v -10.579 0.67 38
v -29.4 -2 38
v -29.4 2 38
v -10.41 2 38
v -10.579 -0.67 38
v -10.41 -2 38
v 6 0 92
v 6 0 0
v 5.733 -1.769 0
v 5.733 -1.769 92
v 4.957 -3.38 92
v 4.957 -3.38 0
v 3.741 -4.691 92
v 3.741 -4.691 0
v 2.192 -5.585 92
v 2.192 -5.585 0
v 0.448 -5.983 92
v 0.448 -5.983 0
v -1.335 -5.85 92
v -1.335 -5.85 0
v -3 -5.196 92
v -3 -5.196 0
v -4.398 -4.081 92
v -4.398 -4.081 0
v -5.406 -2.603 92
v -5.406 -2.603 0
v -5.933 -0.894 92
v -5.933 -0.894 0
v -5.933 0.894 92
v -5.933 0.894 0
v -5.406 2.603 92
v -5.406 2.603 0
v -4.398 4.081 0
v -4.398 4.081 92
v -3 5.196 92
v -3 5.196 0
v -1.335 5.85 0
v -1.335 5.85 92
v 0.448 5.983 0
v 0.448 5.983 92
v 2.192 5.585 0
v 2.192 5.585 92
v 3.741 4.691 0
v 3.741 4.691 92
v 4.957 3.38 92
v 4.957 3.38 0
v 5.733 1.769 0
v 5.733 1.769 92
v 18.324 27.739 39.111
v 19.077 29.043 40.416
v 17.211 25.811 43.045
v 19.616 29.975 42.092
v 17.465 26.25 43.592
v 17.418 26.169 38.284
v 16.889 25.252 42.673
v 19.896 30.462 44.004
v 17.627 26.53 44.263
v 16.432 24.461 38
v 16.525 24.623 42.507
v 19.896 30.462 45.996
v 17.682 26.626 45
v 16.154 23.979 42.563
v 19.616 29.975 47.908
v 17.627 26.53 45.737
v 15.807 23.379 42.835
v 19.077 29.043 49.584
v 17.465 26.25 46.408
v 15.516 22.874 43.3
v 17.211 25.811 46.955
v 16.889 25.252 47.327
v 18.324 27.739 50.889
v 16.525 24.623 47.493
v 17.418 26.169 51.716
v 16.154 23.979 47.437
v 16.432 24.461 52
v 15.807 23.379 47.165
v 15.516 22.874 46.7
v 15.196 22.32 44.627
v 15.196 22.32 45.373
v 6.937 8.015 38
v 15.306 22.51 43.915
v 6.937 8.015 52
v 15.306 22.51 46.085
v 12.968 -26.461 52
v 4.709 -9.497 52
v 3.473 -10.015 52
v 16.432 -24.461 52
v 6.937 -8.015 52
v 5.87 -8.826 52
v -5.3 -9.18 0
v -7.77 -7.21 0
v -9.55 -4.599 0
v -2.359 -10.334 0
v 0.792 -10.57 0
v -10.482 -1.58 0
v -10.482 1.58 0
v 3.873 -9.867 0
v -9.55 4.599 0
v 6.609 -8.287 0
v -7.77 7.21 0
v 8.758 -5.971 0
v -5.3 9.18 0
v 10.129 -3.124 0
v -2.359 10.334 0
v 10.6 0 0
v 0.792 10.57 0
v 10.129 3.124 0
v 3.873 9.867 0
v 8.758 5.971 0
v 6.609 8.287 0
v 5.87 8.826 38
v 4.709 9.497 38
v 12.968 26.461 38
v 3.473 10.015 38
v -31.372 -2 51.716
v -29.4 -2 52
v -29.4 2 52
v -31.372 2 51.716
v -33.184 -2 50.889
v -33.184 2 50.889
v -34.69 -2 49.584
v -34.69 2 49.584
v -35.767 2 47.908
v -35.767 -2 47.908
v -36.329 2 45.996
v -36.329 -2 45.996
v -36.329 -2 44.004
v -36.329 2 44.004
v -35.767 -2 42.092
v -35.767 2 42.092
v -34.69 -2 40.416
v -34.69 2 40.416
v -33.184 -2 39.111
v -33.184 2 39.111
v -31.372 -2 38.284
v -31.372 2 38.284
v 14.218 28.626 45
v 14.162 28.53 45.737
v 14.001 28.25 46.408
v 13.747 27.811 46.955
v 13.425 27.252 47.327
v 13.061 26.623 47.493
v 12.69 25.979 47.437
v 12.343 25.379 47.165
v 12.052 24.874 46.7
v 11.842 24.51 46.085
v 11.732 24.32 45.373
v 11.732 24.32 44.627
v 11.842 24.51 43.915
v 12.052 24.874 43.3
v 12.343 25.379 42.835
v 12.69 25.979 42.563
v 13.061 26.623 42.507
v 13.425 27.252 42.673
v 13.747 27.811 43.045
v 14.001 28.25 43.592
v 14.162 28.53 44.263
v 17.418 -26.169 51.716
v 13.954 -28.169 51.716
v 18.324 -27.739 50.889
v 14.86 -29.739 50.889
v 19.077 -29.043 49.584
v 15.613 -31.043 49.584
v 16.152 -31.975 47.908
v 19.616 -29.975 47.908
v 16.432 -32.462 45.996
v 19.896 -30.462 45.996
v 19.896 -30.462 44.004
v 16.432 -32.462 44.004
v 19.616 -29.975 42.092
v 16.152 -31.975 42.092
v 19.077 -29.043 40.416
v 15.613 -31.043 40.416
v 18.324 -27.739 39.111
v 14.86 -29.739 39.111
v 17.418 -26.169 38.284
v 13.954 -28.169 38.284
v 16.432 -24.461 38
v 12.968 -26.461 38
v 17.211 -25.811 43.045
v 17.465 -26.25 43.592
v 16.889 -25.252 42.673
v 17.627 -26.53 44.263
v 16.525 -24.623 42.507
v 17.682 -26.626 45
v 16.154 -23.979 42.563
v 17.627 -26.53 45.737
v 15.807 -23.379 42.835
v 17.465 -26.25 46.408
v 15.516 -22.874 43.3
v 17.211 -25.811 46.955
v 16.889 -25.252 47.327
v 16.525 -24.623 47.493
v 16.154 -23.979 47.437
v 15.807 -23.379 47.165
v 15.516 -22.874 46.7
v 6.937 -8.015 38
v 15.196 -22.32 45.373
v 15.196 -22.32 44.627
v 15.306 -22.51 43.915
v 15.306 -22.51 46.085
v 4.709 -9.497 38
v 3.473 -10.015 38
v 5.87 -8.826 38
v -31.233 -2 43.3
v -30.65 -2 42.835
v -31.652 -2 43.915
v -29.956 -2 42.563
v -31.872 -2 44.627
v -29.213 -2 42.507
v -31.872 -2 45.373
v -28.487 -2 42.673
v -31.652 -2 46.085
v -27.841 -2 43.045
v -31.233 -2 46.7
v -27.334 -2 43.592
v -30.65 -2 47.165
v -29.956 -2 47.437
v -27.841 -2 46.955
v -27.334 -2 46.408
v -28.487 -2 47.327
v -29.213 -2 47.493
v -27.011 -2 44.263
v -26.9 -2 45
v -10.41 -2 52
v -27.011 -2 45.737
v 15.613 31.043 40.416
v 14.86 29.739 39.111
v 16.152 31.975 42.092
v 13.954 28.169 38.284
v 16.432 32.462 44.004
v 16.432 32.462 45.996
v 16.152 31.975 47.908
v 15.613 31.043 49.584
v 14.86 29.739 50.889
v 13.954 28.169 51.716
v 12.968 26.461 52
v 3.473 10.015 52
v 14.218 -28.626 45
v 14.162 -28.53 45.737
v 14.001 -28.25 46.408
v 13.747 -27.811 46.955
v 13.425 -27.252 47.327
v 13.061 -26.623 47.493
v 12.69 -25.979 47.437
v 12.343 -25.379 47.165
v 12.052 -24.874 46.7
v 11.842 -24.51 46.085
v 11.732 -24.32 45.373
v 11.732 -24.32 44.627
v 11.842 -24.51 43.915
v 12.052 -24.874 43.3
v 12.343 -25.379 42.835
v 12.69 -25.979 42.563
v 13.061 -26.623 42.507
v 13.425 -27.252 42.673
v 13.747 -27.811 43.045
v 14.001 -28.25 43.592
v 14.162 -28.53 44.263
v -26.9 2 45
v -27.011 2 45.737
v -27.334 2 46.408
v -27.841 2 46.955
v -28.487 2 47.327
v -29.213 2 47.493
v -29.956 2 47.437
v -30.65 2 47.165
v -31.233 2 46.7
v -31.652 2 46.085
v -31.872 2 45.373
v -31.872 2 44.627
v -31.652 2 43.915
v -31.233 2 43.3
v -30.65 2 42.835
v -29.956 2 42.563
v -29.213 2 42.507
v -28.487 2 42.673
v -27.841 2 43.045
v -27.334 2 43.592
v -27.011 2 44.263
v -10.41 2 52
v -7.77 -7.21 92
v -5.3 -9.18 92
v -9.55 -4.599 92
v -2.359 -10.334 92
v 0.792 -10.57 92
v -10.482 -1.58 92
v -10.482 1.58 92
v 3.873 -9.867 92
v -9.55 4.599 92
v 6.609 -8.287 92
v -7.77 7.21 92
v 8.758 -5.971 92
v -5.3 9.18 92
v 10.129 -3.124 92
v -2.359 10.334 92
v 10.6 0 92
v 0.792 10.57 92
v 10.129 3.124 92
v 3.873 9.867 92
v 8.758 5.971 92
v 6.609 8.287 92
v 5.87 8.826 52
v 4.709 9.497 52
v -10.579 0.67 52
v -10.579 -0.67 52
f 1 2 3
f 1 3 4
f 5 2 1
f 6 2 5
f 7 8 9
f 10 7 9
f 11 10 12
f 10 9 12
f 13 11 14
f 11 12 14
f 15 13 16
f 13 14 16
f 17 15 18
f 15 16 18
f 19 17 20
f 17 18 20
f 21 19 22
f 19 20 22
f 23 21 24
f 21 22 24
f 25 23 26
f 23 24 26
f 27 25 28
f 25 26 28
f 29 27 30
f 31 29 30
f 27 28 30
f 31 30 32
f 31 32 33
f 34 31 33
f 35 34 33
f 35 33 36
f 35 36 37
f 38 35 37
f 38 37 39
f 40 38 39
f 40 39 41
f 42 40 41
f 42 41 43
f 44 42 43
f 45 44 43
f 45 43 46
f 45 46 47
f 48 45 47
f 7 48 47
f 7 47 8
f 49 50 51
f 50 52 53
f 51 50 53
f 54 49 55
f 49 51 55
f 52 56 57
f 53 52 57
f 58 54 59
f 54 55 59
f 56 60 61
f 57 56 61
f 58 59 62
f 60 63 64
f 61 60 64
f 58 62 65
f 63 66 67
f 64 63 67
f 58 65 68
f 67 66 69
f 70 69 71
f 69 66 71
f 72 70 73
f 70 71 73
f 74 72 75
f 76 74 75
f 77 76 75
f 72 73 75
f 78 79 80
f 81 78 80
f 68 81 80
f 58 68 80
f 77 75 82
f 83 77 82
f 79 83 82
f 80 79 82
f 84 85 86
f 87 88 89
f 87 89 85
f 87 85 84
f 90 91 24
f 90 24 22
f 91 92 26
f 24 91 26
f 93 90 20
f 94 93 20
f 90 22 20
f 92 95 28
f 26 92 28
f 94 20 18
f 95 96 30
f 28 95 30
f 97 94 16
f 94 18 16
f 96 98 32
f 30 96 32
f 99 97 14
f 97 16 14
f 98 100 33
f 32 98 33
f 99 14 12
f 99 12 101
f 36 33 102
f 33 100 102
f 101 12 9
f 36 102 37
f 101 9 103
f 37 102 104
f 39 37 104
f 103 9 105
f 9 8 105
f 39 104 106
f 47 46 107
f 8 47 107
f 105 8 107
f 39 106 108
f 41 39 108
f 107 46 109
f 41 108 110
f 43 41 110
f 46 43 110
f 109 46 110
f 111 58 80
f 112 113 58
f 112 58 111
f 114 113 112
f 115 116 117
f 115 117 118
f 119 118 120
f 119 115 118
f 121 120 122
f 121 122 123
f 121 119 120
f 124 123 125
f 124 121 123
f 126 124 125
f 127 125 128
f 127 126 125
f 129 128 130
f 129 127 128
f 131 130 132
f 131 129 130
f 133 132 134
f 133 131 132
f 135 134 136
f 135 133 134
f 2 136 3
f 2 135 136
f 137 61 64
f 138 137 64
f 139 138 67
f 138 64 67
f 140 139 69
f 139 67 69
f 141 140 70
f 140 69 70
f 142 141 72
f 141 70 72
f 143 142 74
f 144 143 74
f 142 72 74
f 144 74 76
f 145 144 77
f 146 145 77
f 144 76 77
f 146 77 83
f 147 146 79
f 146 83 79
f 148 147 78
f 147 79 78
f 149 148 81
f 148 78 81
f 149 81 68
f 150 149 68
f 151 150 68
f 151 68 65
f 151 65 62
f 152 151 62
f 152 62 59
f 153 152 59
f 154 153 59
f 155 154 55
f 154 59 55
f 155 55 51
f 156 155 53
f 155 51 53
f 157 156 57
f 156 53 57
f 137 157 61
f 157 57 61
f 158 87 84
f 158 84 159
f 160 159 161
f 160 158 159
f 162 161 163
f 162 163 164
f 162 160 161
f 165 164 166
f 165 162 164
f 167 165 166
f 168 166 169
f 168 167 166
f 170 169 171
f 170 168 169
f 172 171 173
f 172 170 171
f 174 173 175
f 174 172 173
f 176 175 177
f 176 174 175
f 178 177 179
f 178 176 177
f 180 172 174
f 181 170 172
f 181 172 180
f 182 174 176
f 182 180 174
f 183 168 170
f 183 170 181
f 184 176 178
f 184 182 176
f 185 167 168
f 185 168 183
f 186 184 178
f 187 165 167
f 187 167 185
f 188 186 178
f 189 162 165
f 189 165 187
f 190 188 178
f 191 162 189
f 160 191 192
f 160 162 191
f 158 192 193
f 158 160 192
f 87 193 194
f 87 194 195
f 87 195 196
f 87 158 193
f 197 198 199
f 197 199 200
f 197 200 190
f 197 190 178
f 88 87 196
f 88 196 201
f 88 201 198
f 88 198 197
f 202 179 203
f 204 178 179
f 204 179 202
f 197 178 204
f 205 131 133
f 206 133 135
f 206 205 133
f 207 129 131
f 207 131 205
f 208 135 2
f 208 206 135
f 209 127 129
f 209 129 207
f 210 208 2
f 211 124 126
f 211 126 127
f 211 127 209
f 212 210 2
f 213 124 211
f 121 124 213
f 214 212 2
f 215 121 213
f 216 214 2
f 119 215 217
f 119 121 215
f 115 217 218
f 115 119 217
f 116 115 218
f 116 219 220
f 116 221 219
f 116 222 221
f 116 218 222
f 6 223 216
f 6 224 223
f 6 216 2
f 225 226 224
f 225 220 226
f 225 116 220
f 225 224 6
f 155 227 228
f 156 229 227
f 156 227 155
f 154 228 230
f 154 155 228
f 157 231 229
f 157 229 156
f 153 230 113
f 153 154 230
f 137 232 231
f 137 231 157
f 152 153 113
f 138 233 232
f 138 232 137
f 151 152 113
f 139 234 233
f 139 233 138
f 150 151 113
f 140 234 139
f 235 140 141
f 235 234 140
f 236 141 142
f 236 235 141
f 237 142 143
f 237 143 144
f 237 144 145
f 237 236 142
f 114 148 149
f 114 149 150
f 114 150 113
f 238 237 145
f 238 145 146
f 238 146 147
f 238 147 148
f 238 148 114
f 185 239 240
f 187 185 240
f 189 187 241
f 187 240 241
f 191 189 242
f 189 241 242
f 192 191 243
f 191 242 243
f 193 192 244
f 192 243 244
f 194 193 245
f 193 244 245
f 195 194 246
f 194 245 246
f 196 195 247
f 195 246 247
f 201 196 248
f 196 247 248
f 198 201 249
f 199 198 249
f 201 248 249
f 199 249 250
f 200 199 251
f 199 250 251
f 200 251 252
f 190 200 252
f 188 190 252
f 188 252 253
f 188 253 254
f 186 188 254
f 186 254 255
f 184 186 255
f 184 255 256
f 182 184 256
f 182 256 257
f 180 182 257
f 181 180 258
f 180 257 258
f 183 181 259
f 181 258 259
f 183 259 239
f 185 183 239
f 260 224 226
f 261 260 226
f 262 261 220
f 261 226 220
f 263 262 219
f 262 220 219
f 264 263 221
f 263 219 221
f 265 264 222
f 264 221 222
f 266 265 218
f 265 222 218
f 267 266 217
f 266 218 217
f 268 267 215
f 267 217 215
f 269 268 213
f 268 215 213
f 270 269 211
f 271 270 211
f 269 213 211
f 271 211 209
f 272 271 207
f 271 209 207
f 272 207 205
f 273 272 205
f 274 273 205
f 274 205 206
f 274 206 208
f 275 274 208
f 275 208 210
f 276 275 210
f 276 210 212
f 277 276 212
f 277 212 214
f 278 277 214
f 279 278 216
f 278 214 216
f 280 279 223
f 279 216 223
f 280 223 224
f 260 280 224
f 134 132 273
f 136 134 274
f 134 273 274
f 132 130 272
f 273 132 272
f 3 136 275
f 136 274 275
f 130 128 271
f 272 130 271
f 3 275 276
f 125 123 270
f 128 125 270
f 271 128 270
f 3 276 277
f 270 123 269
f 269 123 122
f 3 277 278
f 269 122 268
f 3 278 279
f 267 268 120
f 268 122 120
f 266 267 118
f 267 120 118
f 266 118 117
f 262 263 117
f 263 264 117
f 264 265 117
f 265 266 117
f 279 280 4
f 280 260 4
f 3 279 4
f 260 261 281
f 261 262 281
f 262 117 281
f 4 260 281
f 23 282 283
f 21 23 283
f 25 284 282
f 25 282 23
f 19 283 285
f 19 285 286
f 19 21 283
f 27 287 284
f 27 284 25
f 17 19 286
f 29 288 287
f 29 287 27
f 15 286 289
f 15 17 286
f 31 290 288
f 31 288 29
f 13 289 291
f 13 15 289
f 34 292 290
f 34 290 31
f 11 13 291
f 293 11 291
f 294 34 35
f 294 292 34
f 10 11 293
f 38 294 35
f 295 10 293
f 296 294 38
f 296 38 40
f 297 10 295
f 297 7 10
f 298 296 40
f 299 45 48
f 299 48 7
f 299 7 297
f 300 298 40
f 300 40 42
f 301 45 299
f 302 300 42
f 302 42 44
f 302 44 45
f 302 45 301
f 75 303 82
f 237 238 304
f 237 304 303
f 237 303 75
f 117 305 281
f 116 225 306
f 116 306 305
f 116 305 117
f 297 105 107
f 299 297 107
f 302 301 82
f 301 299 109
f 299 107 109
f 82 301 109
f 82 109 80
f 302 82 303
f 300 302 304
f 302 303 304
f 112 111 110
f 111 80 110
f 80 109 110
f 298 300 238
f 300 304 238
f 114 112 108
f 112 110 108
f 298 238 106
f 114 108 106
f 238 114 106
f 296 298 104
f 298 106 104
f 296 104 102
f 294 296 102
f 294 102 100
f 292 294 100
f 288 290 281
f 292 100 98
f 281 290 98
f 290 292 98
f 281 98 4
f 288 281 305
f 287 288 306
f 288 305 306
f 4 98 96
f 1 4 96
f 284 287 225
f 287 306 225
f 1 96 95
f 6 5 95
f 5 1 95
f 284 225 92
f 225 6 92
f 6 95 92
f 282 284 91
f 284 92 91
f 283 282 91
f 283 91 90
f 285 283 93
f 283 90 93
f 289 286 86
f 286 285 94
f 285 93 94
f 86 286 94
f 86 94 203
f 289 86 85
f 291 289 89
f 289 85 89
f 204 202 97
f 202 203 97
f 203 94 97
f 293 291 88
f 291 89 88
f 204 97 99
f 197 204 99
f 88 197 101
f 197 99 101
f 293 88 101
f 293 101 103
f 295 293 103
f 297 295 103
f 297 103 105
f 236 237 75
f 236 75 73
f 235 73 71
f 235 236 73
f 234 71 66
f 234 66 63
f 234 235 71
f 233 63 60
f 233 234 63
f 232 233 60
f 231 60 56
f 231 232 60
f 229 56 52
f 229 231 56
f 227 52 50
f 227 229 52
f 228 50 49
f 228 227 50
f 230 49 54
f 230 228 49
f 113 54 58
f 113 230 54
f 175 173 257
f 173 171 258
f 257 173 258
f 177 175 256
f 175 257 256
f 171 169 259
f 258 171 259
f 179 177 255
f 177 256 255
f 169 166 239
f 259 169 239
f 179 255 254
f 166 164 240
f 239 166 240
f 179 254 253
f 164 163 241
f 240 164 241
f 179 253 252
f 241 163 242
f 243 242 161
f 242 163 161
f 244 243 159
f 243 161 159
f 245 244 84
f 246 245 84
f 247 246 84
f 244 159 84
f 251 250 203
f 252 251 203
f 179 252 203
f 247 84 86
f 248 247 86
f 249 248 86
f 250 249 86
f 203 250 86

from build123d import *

# Parameters (mm, degrees)
F0_R            = 10.6
F1_DEPTH        = 92
F2_R            = 6
F3_DEPTH        = 98.1
F5_DEPTH        = 2
F5_COPIES_COUNT = 3
F7_R            = 2.5
F8_DEPTH        = 4
F9_R            = 2.5
F10_DEPTH       = 4
F11_R           = 2.5
F12_DEPTH       = 4


# Not quite as in the source:
# - a feature of the source that left no trace in its solid (it failed there, or was rolled back) is left out
# - a pattern or mirror of a feature is missing from the dataset's text; its kind, count and spacing are read off the source's solid


with BuildPart() as f1:
    # F0 (on Top) → F1 (new body)
    with BuildSketch(Plane.XY):
        Circle(F0_R)
    extrude(amount=F1_DEPTH)

    # F2 (on face) → F3 (cut)
    with BuildSketch(Plane(origin=(0, 0, 0), x_dir=(1, 0, 0), z_dir=(0, 0, -1))):
        Circle(F2_R)
    extrude(amount=-F3_DEPTH, mode=Mode.SUBTRACT)

    # F4 (on Front) → F5 (join, symmetric)
    with BuildSketch(Plane.XZ):
        with BuildLine():
            Line((-9.7803492099, 52), (-29.4, 52))
            ThreePointArc((-29.4, 52), (-36.4, 45), (-29.4, 38))
            Line((-29.4, 38), (-9.7803492099, 38))
            Line((-9.7803492099, 38), (-9.7803492099, 52))
        make_face()
    f5 = extrude(amount=F5_DEPTH, both=True)

    # F5_copies: F5 ×3 about axis
    f5_copies_axis = Axis((0, 0, 0), (0, 0, 1))
    for i in range(1, F5_COPIES_COUNT):
        add(f5.rotate(f5_copies_axis, i * 360 / F5_COPIES_COUNT))

    # F7 (on face) → F8 (cut, through all)
    with BuildSketch(Plane.XZ.offset(2)):
        with Locations((-29.4, 45)):
            Circle(F7_R)
    extrude(amount=-F8_DEPTH, mode=Mode.SUBTRACT)

    # F9 (on face) → F10 (cut, through all)
    with BuildSketch(Plane(origin=(-1.7320508076, -1, 0), x_dir=(0.5, -0.8660254038, 0), z_dir=(-0.8660254038, -0.5, 0))):
        with Locations((29.4, 45)):
            Circle(F9_R)
    extrude(amount=-F10_DEPTH, mode=Mode.SUBTRACT)

    # F11 (on face) → F12 (cut, through all)
    with BuildSketch(Plane(origin=(1.7320508076, -1, 0), x_dir=(0.5, 0.8660254038, 0), z_dir=(0.8660254038, -0.5, 0))):
        with Locations((29.4, 45)):
            Circle(F11_R)
    extrude(amount=-F12_DEPTH, mode=Mode.SUBTRACT)


solid = f1.part
